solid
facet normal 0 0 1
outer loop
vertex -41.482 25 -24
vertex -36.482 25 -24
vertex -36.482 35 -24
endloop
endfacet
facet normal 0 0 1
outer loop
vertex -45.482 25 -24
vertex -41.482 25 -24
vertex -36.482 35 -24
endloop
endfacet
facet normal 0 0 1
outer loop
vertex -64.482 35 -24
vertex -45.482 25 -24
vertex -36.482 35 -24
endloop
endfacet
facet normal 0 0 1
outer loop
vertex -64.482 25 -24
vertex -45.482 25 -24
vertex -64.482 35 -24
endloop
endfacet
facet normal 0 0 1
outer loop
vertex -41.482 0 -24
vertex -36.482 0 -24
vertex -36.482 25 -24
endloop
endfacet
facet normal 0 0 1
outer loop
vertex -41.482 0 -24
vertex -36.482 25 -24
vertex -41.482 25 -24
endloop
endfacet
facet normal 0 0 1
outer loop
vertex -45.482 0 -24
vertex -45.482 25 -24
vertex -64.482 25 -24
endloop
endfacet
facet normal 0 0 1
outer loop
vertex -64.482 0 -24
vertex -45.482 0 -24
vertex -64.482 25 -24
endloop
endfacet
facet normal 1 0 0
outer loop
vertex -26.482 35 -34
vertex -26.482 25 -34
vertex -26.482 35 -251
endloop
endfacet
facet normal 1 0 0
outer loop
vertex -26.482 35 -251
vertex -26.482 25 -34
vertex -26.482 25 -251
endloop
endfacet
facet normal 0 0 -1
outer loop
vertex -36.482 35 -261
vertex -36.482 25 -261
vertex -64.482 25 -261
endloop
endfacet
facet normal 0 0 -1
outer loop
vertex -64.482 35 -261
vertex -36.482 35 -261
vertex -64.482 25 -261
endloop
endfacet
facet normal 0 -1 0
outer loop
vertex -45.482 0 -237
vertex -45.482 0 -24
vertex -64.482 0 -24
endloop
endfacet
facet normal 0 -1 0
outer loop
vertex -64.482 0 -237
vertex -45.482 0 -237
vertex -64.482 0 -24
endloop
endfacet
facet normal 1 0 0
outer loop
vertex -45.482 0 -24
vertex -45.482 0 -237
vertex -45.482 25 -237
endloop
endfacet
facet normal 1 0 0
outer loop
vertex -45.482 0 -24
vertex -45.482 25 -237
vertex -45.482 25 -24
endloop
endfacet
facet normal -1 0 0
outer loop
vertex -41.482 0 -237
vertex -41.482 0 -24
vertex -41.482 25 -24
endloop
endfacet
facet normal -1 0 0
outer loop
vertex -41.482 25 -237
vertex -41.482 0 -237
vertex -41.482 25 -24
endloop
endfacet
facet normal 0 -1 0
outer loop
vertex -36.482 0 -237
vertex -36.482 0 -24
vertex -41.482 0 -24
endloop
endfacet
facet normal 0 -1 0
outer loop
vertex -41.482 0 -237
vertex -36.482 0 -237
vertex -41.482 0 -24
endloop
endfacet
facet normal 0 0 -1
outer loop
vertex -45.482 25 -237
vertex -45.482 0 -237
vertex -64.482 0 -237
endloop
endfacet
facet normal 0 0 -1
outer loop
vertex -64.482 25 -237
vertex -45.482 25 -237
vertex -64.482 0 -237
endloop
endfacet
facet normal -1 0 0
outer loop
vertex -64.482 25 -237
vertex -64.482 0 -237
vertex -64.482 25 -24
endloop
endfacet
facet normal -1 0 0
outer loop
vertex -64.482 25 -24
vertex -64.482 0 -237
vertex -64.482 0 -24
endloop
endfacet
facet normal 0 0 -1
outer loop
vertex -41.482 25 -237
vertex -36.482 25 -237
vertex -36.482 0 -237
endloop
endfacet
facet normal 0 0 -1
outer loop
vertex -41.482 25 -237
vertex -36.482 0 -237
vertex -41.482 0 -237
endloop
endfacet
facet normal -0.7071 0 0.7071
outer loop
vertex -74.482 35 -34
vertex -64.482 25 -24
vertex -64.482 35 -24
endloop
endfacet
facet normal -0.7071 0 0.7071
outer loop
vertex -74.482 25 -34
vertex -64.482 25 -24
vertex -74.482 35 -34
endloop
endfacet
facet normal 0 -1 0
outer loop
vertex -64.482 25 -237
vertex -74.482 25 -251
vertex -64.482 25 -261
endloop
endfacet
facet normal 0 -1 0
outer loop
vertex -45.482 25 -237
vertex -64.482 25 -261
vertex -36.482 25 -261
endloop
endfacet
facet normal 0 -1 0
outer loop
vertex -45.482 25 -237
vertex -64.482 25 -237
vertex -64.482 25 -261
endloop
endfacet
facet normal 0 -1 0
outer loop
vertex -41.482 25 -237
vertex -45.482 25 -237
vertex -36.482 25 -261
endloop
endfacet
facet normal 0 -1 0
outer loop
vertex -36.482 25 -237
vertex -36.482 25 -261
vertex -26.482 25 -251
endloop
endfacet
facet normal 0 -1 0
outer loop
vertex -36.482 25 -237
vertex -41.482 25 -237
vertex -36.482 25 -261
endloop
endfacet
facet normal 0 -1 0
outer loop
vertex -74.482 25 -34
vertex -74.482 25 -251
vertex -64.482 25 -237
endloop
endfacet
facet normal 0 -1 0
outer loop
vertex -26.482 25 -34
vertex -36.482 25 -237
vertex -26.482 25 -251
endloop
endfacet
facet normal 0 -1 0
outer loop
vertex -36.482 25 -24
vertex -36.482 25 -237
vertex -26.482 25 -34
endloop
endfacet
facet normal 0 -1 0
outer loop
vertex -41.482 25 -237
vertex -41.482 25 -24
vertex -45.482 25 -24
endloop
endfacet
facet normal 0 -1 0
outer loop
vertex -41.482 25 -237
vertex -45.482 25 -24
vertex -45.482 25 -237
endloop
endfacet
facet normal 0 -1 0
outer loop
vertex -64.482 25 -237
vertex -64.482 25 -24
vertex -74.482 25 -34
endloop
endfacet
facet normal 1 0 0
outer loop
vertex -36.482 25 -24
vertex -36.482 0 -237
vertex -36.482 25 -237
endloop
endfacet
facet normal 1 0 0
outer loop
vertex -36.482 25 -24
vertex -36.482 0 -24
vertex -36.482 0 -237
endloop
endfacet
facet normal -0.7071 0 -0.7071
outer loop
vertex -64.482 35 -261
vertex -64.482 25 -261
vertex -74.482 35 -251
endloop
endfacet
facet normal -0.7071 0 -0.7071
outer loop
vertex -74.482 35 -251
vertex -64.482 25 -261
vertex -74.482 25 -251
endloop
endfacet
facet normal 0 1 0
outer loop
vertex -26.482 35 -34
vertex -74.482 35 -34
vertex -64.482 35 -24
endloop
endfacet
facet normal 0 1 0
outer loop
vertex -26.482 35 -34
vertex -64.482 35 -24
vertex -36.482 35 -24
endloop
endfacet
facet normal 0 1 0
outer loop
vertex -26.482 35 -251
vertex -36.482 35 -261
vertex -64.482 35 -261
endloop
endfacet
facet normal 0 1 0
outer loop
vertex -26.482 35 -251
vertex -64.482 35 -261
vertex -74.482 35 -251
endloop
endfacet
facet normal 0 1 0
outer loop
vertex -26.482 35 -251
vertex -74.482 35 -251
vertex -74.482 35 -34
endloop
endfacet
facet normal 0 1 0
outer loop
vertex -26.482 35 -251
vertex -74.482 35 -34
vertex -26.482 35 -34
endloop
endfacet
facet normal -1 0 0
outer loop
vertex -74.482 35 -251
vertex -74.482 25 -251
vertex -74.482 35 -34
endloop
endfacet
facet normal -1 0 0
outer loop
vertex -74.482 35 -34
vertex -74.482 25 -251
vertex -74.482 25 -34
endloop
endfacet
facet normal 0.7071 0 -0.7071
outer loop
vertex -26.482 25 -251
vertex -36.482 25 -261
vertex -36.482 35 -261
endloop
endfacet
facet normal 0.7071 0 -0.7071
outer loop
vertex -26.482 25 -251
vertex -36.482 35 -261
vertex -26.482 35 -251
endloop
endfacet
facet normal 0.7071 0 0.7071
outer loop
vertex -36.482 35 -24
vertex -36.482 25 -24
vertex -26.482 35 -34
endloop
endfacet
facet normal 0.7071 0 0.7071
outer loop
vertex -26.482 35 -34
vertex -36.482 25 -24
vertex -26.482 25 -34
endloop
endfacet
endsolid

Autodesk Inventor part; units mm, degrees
ref_plane "YZ Plane" through (0, 0, 0) normal (1, 0, 0) x (0, 1, 0)
ref_plane "XZ Plane" through (0, 0, 0) normal (0, 1, 0) x (-1, 0, 0)
ref_plane "XY Plane" through (0, 0, 0) normal (0, 0, 1) x (1, 0, 0)
sketch "Sketch1" plane through (0, 0, 0) normal (0, 1, 0) x (-1, 0, 0)
  line L0 (45.4816, -24) -> (64.4816, -24)
  line L1 (64.4816, -224) -> (45.4816, -224)
  line L2 (64.4816, -24) -> (52.9072, -24)
  line L3 (45.4816, -51) -> (64.4816, -51)
  line L4 (64.4816, -50.2724) -> (64.4816, -24)
  line L5 (64.4816, -69) -> (45.4816, -69)
  line L6 (45.4816, -51) -> (45.4816, -24)
  line L7 (64.4816, -24) -> (64.4816, -51)
  line L8 (64.4816, -154) -> (45.4816, -154)
  line L9 (64.4816, -204) -> (45.4816, -204)
  line L10 (45.4816, -224) -> (45.4816, -204)
  line L11 (45.4816, -154) -> (45.4816, -69)
  line L12 (64.4816, -69) -> (64.4816, -154)
  line L13 (64.4816, -204) -> (64.4816, -224)
  line L14 (41.4816, -24) -> (36.4816, -24)
  line L15 (36.4816, -24) -> (36.4816, -224)
  line L16 (36.4816, -224) -> (41.4816, -224)
  line L17 (41.4816, -224) -> (41.4816, -24)
  point P0 (0, 0)
  dimension "d0" = 200
  dimension "d1" = 19
  dimension "d7" = 27
  dimension "d9" = 45
  dimension "d11" = 85
  dimension "d12" = 20
  dimension "d13" = 4
  dimension "d14" = 19
  dimension "d15" = 5
extrude "Extrusion2" add sketch "Sketch1" along normal blind 11
sketch "Sketch2" plane through (0, 11, 0) normal (0, 1, 0) x (1, 0, 0)
  line L0 (-64.4816, 224) -> (-36.4816, 224)
  line L1 (-36.4816, 224) -> (-36.4816, 24)
  line L2 (-36.4816, 24) -> (-64.4816, 24)
  line L3 (-64.4816, 24) -> (-64.4816, 224)
  point P0 (0, 0)
extrude "Extrusion3" add sketch "Sketch2" along normal blind 3
sketch "Sketch3" plane through (0, 0, 0) normal (0, -1, 0) x (1, 0, 0)
  line L0 (-19.3539, -51.0239) -> (-76.8291, -51.0239)
  line L1 (-76.8291, -51.0239) -> (-76.8291, -110.8451)
  line L2 (-76.8291, -110.8451) -> (-19.3539, -110.8451)
  line L3 (-19.3539, -110.8451) -> (-19.3539, -51.0239)
  line L4 (-25.2187, -135.4773) -> (-86.9948, -135.4773)
  line L5 (-86.9948, -135.4773) -> (-86.9948, -203.9002)
  line L6 (-86.9948, -203.9002) -> (-25.2187, -203.9002)
  line L7 (-25.2187, -203.9002) -> (-25.2187, -135.4773)
  point P0 (0, 0)
extrude "Extrusion4" cut sketch "Sketch3" against normal up to surface (11 mm away)
sketch "Sketch4" plane through (0, 14, 0) normal (0, 1, 0) x (1, 0, 0)
  line L0 (-64.4816, 24) -> (-36.4816, 24)
  line L1 (-26.4816, 34) -> (-26.4816, 251)
  line L2 (-36.4816, 261) -> (-64.4816, 261)
  line L3 (-74.4816, 251) -> (-74.4816, 34)
  line L4 (-64.4816, 224) -> (-64.4816, 24) projected
  line L5 (-36.4816, 24) -> (-36.4816, 224) projected
  line L6 (-36.4816, 224) -> (-64.4816, 224) projected
  line L7 (-64.4816, 24) -> (-74.4816, 34)
  line L8 (-36.4816, 24) -> (-26.4816, 34)
  line L9 (-64.4816, 261) -> (-74.4816, 251)
  line L10 (-36.4816, 261) -> (-26.4816, 251)
  point P0 (0, 0)
  point P1 (-74.4816, 24)
  point P2 (-26.4816, 261)
  point P3 (-26.4816, 24)
  point P4 (-74.4816, 261)
  dimension "d22" = 10
  dimension "d23" = 10
  dimension "d24" = 37
  dimension "d31" = 10
  dimension "d32" = 10
  dimension "d33" = 10
  dimension "d34" = 10
  dimension "d35" = 10
  dimension "d36" = 10
  dimension "d37" = 10
  dimension "d38" = 10
extrude "Extrusion5" add sketch "Sketch4" along normal blind 21
sketch "Sketch5" plane through (-45.4816, 0, -224) normal (0, 0, -1) x (-1, 0, 0)
  line L0 (-9, 0) -> (-4, 0) projected
  line L1 (-4, 0) -> (-4, 11) projected
  line L2 (0, 11) -> (-4, 11) projected
  line L3 (0, 0) -> (0, 11) projected
  line L4 (19, 0) -> (0, 0) projected
  line L5 (19, 0) -> (19, 14) projected
  line L6 (-9, 14) -> (19, 14) projected
  line L7 (-9, 0) -> (-9, 14) projected
  point P0 (-45.4816, 0)
extrude "Extrusion6" add sketch "Sketch5" along normal blind 13
sketch "Sketch6" plane through (0, 11, 0) normal (0, -1, 0) x (1, 0, 0)
  line L0 (-41.4816, -51.0239) -> (-41.4816, -24) projected
  line L1 (-41.4816, -24) -> (-45.4816, -24) projected
  line L2 (-45.4816, -24) -> (-45.4816, -51) projected
  line L3 (-45.4816, -51) -> (-64.4816, -51) projected
  line L4 (-64.4816, -110.8451) -> (-64.4816, -51) projected
  line L5 (-64.4816, -110.8451) -> (-45.4816, -110.8451) projected
  line L6 (-45.4816, -110.8451) -> (-45.4816, -135.4773) projected
  line L7 (-45.4816, -135.4773) -> (-64.4816, -135.4773) projected
  line L8 (-64.4816, -204) -> (-64.4816, -135.4773) projected
  line L9 (-64.4816, -204) -> (-45.4816, -204) projected
  line L10 (-45.4816, -204) -> (-45.4816, -237) projected
  line L11 (-41.4816, -237) -> (-45.4816, -237) projected
  line L12 (-41.4816, -203.9002) -> (-41.4816, -237) projected
  line L13 (-41.4816, -203.9002) -> (-36.4816, -203.9002) projected
  line L14 (-36.4816, -135.4773) -> (-36.4816, -203.9002) projected
  line L15 (-36.4816, -135.4773) -> (-41.4816, -135.4773) projected
  line L16 (-41.4816, -135.4773) -> (-41.4816, -110.8451) projected
  line L17 (-41.4816, -110.8451) -> (-36.4816, -110.8451) projected
  line L18 (-36.4816, -51.0239) -> (-36.4816, -110.8451) projected
  line L19 (-36.4816, -51.0239) -> (-41.4816, -51.0239) projected
  point P0 (0, 0)
extrude "Extrusion7" cut sketch "Sketch6" against normal up to surface (3 mm away)
sketch "Sketch7" plane through (0, 14, 0) normal (0, -1, 0) x (1, 0, 0)
  line L0 (-36.4816, -110.8451) -> (-36.4816, -135.4773) projected
  line L1 (-41.4816, -135.4773) -> (-36.4816, -135.4773) projected
  line L2 (-41.4816, -110.8451) -> (-41.4816, -135.4773) projected
  line L3 (-36.4816, -110.8451) -> (-41.4816, -110.8451) projected
  line L4 (-41.4816, -51.0239) -> (-36.4816, -51.0239) projected
  line L5 (-41.4816, -24) -> (-41.4816, -51.0239) projected
  line L6 (-45.4816, -24) -> (-41.4816, -24) projected
  line L7 (-45.4816, -51) -> (-45.4816, -24) projected
  line L8 (-64.4816, -51) -> (-45.4816, -51) projected
  line L9 (-64.4816, -51) -> (-64.4816, -24) projected
  line L10 (-64.4816, -24) -> (-74.4816, -34) projected
  line L11 (-74.4816, -34) -> (-74.4816, -251) projected
  line L12 (-74.4816, -251) -> (-64.4816, -261) projected
  line L13 (-64.4816, -261) -> (-36.4816, -261) projected
  line L14 (-36.4816, -261) -> (-26.4816, -251) projected
  line L15 (-26.4816, -251) -> (-26.4816, -34) projected
  line L16 (-26.4816, -34) -> (-36.4816, -24) projected
  line L17 (-36.4816, -24) -> (-36.4816, -51.0239) projected
  line L18 (-36.4816, -203.9002) -> (-36.4816, -237) projected
  line L19 (-36.4816, -237) -> (-41.4816, -237) projected
  line L20 (-41.4816, -203.9002) -> (-41.4816, -237) projected
  line L21 (-36.4816, -203.9002) -> (-41.4816, -203.9002) projected
  line L22 (-45.4816, -110.8451) -> (-64.4816, -110.8451) projected
  line L23 (-45.4816, -135.4773) -> (-45.4816, -110.8451) projected
  line L24 (-64.4816, -135.4773) -> (-45.4816, -135.4773) projected
  line L25 (-64.4816, -135.4773) -> (-64.4816, -110.8451) projected
  line L26 (-45.4816, -204) -> (-64.4816, -204) projected
  line L27 (-45.4816, -237) -> (-45.4816, -204) projected
  line L28 (-45.4816, -237) -> (-64.4816, -237) projected
  line L29 (-64.4816, -237) -> (-64.4816, -204) projected
  point P0 (0, 0)
extrude "Extrusion8" cut sketch "Sketch7" against normal blind 11
sketch "Sketch8" plane through (-64.4816, 0, -204) normal (0, 0, 1) x (1, 0, 0)
  line L0 (0, 0) -> (0, 25) projected
  line L1 (19, 0) -> (0, 0) projected
  line L2 (19, 0) -> (19, 25) projected
  line L3 (19, 25) -> (0, 25) projected
  line L4 (0, 0) -> (0, 25) projected
  line L5 (23, 0) -> (23, 25) projected
  line L6 (28, 0) -> (23, 0) projected
  line L7 (28, 25) -> (28, 0) projected
  line L8 (28, 25) -> (23, 25) projected
  point P0 (64.4816, 0)
extrude "Extrusion9" add sketch "Sketch8" along normal up to surface (180 mm away)
equation "\"d32\" = d31"
equation "\"d33\" = d31"
equation "\"d34\" = d33"
equation "\"d36\" = d35"
equation "\"d38\" = d37"
properties part number "cut platform"
